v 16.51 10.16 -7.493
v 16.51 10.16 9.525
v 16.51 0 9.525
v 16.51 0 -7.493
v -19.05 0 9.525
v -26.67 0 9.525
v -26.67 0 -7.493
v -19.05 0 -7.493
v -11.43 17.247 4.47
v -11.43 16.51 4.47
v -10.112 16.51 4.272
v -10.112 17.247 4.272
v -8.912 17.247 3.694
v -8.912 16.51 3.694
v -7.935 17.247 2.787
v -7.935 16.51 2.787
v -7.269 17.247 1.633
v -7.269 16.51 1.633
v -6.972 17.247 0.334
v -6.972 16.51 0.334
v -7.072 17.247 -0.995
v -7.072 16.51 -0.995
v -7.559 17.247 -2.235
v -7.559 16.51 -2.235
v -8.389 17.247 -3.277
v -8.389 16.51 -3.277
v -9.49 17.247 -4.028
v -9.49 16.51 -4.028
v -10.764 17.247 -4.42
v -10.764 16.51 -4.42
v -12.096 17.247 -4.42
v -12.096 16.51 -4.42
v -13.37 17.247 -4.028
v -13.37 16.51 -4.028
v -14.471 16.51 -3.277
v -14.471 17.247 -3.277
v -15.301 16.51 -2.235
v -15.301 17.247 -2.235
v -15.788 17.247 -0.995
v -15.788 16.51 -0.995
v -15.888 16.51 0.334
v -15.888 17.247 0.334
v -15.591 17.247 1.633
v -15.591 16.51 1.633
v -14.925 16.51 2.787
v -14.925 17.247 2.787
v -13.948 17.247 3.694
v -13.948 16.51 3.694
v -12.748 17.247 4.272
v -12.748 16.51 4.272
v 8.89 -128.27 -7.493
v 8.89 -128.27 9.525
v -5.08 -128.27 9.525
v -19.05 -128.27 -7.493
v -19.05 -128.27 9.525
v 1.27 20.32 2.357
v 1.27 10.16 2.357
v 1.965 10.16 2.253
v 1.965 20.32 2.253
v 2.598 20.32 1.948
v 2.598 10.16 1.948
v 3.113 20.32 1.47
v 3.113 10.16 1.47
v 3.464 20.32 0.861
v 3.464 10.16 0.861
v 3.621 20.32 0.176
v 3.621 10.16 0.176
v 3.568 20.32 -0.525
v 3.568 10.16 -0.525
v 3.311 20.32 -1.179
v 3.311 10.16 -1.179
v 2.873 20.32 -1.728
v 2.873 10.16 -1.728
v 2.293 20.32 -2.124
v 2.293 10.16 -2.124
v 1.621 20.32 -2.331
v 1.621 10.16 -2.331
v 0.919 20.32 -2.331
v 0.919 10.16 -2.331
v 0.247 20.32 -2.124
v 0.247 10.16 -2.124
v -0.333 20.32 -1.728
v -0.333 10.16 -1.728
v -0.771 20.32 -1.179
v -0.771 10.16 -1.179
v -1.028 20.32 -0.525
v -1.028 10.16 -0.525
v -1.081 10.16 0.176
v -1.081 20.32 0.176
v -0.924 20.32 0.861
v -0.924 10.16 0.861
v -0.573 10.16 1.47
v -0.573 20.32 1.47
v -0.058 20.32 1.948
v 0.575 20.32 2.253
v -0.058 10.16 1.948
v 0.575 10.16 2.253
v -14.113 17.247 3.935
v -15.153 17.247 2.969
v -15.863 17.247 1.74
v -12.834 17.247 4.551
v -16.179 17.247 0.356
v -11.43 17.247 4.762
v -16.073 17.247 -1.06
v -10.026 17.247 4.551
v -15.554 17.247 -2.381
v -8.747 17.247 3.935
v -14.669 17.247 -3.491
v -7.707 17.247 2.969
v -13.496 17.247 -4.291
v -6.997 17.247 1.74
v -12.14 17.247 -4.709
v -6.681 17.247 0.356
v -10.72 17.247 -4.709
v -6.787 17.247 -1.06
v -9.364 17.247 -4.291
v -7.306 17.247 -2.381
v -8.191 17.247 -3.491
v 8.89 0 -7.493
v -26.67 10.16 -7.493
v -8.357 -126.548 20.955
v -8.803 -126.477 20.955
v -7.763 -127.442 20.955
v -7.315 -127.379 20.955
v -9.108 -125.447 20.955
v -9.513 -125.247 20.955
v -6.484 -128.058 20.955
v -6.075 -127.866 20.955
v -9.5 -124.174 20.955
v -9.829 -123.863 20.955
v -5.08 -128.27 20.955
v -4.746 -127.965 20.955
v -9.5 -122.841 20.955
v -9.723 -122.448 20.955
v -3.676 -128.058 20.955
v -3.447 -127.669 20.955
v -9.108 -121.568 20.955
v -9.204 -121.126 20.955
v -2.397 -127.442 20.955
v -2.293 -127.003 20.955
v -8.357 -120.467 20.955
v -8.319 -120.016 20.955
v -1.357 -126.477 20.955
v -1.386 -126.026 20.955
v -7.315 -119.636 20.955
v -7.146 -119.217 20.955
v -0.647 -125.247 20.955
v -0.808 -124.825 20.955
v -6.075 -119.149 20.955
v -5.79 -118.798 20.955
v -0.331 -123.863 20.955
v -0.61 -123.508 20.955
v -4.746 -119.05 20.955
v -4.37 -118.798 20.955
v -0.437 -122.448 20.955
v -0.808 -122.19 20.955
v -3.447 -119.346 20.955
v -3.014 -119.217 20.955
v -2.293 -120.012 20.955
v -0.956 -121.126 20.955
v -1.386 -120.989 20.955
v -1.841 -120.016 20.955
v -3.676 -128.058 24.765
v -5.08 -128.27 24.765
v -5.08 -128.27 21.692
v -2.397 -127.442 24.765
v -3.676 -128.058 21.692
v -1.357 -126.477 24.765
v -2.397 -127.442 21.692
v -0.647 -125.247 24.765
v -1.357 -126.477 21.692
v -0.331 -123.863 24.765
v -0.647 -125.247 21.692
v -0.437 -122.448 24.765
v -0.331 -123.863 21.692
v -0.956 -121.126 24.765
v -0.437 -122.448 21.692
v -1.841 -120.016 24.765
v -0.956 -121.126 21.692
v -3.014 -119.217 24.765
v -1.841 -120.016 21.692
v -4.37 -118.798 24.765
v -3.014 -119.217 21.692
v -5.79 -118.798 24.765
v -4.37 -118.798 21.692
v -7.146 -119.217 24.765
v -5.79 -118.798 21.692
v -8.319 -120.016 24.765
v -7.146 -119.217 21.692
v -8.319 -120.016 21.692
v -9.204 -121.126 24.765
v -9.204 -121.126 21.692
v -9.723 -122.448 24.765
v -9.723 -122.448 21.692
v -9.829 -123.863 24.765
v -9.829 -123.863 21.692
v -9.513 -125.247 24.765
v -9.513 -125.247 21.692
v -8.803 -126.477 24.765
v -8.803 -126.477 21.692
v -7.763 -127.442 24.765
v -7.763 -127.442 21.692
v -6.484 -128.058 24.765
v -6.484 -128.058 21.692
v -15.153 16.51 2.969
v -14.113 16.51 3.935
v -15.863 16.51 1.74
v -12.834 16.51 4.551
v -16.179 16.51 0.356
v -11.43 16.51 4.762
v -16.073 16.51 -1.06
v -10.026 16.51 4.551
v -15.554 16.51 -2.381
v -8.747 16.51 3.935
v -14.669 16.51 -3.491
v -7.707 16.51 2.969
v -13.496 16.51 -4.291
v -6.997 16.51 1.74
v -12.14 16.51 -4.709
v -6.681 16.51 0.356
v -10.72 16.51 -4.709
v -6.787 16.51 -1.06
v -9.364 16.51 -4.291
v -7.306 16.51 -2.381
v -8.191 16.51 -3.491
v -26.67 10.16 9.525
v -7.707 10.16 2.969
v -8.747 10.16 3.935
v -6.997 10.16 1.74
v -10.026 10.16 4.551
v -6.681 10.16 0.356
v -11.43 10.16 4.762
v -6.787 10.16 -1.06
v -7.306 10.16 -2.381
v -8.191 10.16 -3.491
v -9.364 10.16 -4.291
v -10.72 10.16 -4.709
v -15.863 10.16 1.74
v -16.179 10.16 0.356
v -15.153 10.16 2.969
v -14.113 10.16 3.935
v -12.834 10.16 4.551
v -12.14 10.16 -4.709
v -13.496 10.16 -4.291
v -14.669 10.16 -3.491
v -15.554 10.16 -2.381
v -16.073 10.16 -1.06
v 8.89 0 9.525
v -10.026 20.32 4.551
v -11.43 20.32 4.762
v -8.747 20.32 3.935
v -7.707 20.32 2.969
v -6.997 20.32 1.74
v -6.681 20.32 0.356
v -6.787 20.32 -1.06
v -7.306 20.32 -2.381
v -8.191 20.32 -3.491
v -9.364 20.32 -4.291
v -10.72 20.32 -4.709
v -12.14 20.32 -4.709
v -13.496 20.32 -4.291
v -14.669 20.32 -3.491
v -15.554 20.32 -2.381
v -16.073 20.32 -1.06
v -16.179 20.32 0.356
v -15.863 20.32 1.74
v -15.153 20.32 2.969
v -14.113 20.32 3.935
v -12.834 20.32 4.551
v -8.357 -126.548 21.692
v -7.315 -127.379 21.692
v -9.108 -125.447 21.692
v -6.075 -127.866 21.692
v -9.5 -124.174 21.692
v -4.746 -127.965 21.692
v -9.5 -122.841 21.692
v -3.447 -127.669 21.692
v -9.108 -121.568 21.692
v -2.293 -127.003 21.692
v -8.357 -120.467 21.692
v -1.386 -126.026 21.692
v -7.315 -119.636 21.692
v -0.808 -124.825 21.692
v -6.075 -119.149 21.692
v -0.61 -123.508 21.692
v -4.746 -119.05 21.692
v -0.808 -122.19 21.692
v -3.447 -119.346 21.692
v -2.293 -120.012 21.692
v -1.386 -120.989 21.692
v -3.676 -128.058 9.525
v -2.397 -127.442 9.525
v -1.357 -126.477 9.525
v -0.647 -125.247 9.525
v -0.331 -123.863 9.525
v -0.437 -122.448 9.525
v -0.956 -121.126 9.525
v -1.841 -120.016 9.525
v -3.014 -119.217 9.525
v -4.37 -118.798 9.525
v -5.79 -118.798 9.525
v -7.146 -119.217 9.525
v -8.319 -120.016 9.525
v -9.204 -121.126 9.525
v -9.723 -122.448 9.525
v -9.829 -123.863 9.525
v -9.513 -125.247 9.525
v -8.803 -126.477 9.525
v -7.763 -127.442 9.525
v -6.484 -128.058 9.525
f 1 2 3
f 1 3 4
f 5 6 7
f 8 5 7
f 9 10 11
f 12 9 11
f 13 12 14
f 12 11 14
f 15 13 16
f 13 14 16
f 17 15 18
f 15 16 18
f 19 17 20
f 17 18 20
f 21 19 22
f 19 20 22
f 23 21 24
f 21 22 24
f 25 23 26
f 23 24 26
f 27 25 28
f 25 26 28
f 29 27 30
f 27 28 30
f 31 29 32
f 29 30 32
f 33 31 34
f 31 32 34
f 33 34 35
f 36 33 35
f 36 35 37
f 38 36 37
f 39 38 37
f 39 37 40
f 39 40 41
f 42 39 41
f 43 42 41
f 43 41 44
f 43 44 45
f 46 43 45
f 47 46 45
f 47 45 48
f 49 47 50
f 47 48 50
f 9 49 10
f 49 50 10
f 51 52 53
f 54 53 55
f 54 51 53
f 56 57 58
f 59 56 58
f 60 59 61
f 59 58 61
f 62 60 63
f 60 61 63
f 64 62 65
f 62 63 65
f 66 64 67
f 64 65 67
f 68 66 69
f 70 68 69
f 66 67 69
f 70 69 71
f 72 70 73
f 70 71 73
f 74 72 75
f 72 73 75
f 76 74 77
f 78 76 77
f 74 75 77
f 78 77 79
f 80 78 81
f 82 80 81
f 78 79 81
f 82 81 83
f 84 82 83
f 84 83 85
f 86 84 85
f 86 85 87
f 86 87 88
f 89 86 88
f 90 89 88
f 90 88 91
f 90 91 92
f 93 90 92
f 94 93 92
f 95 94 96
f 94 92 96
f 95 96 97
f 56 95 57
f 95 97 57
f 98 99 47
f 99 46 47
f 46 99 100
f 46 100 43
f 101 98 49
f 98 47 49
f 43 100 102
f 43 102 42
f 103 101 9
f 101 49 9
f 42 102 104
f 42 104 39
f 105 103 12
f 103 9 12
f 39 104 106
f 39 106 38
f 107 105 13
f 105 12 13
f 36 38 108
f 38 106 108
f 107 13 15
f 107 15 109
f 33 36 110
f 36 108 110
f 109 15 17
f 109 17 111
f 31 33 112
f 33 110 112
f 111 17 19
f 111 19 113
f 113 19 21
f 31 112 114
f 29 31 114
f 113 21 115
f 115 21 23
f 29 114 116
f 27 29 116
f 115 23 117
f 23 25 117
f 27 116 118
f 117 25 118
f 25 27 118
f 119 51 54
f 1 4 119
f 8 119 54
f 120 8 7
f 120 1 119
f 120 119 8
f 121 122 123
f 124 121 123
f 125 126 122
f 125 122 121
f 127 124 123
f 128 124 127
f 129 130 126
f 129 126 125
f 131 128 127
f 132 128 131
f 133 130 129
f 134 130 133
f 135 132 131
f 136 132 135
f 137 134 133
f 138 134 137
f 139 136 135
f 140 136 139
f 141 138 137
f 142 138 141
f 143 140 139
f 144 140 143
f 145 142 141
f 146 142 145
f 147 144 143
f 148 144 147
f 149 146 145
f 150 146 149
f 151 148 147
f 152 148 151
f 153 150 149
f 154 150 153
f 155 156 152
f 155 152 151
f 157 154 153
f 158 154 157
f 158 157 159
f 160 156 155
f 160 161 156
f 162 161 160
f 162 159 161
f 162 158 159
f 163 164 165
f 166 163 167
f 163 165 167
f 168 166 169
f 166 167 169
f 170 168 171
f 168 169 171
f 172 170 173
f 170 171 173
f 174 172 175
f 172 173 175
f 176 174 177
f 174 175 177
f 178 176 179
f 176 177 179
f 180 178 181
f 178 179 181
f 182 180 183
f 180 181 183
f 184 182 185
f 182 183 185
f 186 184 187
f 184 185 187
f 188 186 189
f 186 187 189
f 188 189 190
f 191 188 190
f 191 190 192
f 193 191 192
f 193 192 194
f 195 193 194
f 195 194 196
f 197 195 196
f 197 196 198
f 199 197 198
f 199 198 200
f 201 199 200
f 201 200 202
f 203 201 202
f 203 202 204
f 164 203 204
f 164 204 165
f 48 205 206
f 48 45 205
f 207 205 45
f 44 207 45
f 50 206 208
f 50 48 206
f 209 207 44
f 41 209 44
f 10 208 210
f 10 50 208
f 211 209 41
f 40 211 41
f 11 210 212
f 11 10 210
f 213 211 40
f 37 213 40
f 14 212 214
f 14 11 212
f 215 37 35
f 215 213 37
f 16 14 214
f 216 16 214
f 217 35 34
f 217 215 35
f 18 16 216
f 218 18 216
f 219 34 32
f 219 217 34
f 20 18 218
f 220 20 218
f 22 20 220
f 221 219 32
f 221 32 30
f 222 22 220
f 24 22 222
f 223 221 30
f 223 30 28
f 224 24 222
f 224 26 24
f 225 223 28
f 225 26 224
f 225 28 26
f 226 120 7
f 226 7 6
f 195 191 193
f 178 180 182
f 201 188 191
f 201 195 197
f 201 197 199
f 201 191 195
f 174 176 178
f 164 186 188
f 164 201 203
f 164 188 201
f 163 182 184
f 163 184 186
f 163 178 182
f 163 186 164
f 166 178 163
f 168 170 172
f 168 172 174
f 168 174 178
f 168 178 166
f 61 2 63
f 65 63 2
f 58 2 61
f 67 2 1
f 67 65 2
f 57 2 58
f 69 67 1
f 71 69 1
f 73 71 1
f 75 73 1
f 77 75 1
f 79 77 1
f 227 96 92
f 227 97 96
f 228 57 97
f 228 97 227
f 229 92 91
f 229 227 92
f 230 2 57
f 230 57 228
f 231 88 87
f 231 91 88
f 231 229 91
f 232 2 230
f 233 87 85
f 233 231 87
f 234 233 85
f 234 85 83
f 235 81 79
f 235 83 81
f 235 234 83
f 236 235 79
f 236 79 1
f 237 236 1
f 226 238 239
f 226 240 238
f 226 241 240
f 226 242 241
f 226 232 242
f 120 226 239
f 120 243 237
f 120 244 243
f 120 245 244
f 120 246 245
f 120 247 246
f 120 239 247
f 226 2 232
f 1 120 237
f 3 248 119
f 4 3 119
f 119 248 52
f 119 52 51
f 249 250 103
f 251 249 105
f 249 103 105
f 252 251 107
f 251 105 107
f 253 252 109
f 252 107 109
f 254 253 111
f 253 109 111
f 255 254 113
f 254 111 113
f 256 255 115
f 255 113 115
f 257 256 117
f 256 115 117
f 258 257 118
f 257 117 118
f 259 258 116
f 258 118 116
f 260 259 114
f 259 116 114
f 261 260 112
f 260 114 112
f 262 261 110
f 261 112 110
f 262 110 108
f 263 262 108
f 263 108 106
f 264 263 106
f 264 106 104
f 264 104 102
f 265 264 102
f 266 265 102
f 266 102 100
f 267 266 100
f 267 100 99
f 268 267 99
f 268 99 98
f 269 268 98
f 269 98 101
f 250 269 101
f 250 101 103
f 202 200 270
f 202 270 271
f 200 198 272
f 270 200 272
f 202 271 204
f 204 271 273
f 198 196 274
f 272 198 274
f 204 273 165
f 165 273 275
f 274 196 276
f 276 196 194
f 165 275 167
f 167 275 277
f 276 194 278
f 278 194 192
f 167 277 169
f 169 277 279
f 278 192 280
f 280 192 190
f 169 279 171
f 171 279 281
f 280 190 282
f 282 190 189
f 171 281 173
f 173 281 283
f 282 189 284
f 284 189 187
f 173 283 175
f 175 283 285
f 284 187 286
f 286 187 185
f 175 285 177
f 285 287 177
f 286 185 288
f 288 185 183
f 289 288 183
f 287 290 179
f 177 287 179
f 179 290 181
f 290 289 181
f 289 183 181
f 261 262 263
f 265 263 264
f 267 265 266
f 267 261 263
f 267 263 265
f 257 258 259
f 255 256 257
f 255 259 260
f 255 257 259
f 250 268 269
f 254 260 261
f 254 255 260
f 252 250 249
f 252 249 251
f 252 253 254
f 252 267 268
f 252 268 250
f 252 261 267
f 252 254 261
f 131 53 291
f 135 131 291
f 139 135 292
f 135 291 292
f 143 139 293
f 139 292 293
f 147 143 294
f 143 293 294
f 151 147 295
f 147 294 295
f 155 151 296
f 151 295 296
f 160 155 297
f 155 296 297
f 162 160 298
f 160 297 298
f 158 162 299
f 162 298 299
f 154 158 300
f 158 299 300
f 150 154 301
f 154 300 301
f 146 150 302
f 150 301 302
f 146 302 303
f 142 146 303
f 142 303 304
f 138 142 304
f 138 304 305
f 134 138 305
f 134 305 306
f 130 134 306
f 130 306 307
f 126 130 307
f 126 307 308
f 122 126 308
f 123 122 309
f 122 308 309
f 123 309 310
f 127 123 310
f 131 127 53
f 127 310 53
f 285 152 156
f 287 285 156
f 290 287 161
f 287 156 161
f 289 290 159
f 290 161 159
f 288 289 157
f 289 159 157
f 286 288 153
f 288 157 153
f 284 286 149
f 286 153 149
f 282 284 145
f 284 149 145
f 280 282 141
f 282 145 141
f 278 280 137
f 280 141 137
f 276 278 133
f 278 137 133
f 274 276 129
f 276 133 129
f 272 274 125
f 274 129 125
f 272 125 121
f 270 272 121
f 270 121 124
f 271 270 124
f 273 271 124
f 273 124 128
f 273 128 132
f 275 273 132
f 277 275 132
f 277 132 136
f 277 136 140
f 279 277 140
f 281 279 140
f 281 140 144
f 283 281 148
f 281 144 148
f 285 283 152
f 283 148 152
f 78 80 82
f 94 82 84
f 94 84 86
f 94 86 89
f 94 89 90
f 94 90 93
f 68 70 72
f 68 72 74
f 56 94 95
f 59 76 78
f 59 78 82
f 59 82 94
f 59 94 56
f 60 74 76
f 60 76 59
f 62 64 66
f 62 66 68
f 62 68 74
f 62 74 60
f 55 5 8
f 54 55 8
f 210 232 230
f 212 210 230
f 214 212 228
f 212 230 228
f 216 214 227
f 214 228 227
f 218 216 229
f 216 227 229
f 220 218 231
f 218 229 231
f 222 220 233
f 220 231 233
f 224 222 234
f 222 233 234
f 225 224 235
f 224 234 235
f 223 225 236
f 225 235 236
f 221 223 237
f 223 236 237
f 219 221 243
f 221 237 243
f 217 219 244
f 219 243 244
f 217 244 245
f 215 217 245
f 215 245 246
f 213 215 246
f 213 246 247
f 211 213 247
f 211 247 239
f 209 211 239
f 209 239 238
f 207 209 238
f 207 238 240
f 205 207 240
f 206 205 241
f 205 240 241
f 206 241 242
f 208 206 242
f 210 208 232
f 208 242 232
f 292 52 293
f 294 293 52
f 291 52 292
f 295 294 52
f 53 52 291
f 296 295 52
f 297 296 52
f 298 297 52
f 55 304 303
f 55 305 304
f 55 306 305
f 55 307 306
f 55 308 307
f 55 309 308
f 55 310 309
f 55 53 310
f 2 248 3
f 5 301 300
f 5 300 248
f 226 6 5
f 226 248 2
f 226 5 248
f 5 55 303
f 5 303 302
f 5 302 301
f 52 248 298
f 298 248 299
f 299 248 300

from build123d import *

# Parameters (mm, degrees)
SKETCH1_W              = 33.02
SKETCH1_H              = 19.05
BOSS_EXTRUDE1_DEPTH    = 10.16
SKETCH2_R              = 4.7625
SKETCH2_R_2            = 2.357295936
BOSS_EXTRUDE2_DEPTH    = 10.16
SKETCH5_W              = 19.05
SKETCH5_H              = 10.16
BOSS_EXTRUDE3_DEPTH    = 5.08
SKETCH6_W              = 19.05
SKETCH6_H              = 10.16
BOSS_EXTRUDE4_DEPTH    = 5.08
SKETCH7_W              = 27.94
SKETCH7_H              = 19.05
BOSS_EXTRUDE5_DEPTH    = 128.27
SKETCH9_R              = 4.7625
BOSS_EXTRUDE6_DEPTH    = 15.24
SKETCH10_W             = 43.18
SKETCH10_H             = 138.43
CUT_EXTRUDE1_DEPTH     = 2.032
CUT_EXTRUDE2_START     = 20.955
CUT_EXTRUDE2_OUTLINE_R = 4.7625
CUT_EXTRUDE2_DEPTH     = 0.7366
SKETCH11_R             = 4.4704
BOSS_EXTRUDE7_DEPTH    = 0.7366
CUT_EXTRUDE3_START     = 16.51
CUT_EXTRUDE3_OUTLINE_R = 4.7625
CUT_EXTRUDE3_DEPTH     = 0.7366
SKETCH12_R             = 4.4704
BOSS_EXTRUDE8_DEPTH    = 0.7366


# Read off the part's stored shape, not the designer's step: Cut-Extrude2, Cut-Extrude3
with BuildPart() as part:
    # Sketch1 → Boss-Extrude1 (new body)
    with BuildSketch(Plane(origin=(0, 0, 0), x_dir=(1, 0, 0), z_dir=(0, 1, 0))):
        with Locations((-5.08, 0)):
            Rectangle(SKETCH1_W, SKETCH1_H)
    extrude(amount=BOSS_EXTRUDE1_DEPTH)

    # Sketch2 → Boss-Extrude2 (add)
    with BuildSketch(Plane(origin=(0, 10.16, 0), x_dir=(1, 0, 0), z_dir=(0, 1, 0))):
        with Locations(Location((-11.43, 0, 0), (0, 0, 270))):
            Circle(SKETCH2_R)
        with Locations(Location((1.27, 0, 0), (0, 0, 270))):
            Circle(SKETCH2_R_2)
    extrude(amount=BOSS_EXTRUDE2_DEPTH)

    # Sketch5 → Boss-Extrude3 (add)
    with BuildSketch(Plane.ZY.offset(21.59)):
        with Locations((0, 5.08)):
            Rectangle(SKETCH5_W, SKETCH5_H)
    extrude(amount=BOSS_EXTRUDE3_DEPTH)

    # Sketch6 → Boss-Extrude4 (add)
    with BuildSketch(Plane(origin=(11.43, 0, 0), x_dir=(0, 0, -1), z_dir=(1, 0, 0))):
        with Locations((0, 5.08)):
            Rectangle(SKETCH6_W, SKETCH6_H)
    extrude(amount=BOSS_EXTRUDE4_DEPTH)

    # Sketch7 → Boss-Extrude5 (add)
    with BuildSketch(Plane(origin=(0, 0, 0), x_dir=(-1, 0, 0), z_dir=(0, -1, 0))):
        with Locations((5.08, 0)):
            Rectangle(SKETCH7_W, SKETCH7_H)
    extrude(amount=BOSS_EXTRUDE5_DEPTH)

    # Sketch9 → Boss-Extrude6 (add)
    with BuildSketch(Plane.XY.offset(9.525)):
        with Locations(Location((-5.08, -123.5075, 0), (0, 0, 270))):
            Circle(SKETCH9_R)
    extrude(amount=BOSS_EXTRUDE6_DEPTH)

    # Sketch10 → Cut-Extrude1 (cut)
    with BuildSketch(Plane(origin=(0, 0, -9.525), x_dir=(-1, 0, 0), z_dir=(0, 0, -1))):
        with Locations((5.08, -59.055)):
            Rectangle(SKETCH10_W, SKETCH10_H)
    extrude(amount=-CUT_EXTRUDE1_DEPTH, mode=Mode.SUBTRACT)

    # Cut-Extrude2 outline → Cut-Extrude2 (cut)
    with BuildSketch(Plane.XY.offset(CUT_EXTRUDE2_START)):
        with Locations((-5.08, -123.5075)):
            Circle(CUT_EXTRUDE2_OUTLINE_R)
    extrude(amount=CUT_EXTRUDE2_DEPTH, mode=Mode.SUBTRACT)

    # Sketch11 → Boss-Extrude7 (add)
    with BuildSketch(Plane.XY.offset(20.955)):
        with Locations((-5.08, -123.5075)):
            Circle(SKETCH11_R)
    extrude(amount=BOSS_EXTRUDE7_DEPTH)

    # Cut-Extrude3 outline → Cut-Extrude3 (cut)
    with BuildSketch(Plane(origin=(0, 0, 0), x_dir=(1, 0, 0), z_dir=(0, 1, 0)).offset(CUT_EXTRUDE3_START)):
        with Locations((-11.43, 0)):
            Circle(CUT_EXTRUDE3_OUTLINE_R)
    extrude(amount=CUT_EXTRUDE3_DEPTH, mode=Mode.SUBTRACT)

    # Sketch12 → Boss-Extrude8 (add)
    with BuildSketch(Plane(origin=(0, 16.51, 0), x_dir=(1, 0, 0), z_dir=(0, 1, 0))):
        with Locations(Location((-11.43, 0, 0), (0, 0, 270))):
            Circle(SKETCH12_R)
    extrude(amount=BOSS_EXTRUDE8_DEPTH)


solid = part.part
